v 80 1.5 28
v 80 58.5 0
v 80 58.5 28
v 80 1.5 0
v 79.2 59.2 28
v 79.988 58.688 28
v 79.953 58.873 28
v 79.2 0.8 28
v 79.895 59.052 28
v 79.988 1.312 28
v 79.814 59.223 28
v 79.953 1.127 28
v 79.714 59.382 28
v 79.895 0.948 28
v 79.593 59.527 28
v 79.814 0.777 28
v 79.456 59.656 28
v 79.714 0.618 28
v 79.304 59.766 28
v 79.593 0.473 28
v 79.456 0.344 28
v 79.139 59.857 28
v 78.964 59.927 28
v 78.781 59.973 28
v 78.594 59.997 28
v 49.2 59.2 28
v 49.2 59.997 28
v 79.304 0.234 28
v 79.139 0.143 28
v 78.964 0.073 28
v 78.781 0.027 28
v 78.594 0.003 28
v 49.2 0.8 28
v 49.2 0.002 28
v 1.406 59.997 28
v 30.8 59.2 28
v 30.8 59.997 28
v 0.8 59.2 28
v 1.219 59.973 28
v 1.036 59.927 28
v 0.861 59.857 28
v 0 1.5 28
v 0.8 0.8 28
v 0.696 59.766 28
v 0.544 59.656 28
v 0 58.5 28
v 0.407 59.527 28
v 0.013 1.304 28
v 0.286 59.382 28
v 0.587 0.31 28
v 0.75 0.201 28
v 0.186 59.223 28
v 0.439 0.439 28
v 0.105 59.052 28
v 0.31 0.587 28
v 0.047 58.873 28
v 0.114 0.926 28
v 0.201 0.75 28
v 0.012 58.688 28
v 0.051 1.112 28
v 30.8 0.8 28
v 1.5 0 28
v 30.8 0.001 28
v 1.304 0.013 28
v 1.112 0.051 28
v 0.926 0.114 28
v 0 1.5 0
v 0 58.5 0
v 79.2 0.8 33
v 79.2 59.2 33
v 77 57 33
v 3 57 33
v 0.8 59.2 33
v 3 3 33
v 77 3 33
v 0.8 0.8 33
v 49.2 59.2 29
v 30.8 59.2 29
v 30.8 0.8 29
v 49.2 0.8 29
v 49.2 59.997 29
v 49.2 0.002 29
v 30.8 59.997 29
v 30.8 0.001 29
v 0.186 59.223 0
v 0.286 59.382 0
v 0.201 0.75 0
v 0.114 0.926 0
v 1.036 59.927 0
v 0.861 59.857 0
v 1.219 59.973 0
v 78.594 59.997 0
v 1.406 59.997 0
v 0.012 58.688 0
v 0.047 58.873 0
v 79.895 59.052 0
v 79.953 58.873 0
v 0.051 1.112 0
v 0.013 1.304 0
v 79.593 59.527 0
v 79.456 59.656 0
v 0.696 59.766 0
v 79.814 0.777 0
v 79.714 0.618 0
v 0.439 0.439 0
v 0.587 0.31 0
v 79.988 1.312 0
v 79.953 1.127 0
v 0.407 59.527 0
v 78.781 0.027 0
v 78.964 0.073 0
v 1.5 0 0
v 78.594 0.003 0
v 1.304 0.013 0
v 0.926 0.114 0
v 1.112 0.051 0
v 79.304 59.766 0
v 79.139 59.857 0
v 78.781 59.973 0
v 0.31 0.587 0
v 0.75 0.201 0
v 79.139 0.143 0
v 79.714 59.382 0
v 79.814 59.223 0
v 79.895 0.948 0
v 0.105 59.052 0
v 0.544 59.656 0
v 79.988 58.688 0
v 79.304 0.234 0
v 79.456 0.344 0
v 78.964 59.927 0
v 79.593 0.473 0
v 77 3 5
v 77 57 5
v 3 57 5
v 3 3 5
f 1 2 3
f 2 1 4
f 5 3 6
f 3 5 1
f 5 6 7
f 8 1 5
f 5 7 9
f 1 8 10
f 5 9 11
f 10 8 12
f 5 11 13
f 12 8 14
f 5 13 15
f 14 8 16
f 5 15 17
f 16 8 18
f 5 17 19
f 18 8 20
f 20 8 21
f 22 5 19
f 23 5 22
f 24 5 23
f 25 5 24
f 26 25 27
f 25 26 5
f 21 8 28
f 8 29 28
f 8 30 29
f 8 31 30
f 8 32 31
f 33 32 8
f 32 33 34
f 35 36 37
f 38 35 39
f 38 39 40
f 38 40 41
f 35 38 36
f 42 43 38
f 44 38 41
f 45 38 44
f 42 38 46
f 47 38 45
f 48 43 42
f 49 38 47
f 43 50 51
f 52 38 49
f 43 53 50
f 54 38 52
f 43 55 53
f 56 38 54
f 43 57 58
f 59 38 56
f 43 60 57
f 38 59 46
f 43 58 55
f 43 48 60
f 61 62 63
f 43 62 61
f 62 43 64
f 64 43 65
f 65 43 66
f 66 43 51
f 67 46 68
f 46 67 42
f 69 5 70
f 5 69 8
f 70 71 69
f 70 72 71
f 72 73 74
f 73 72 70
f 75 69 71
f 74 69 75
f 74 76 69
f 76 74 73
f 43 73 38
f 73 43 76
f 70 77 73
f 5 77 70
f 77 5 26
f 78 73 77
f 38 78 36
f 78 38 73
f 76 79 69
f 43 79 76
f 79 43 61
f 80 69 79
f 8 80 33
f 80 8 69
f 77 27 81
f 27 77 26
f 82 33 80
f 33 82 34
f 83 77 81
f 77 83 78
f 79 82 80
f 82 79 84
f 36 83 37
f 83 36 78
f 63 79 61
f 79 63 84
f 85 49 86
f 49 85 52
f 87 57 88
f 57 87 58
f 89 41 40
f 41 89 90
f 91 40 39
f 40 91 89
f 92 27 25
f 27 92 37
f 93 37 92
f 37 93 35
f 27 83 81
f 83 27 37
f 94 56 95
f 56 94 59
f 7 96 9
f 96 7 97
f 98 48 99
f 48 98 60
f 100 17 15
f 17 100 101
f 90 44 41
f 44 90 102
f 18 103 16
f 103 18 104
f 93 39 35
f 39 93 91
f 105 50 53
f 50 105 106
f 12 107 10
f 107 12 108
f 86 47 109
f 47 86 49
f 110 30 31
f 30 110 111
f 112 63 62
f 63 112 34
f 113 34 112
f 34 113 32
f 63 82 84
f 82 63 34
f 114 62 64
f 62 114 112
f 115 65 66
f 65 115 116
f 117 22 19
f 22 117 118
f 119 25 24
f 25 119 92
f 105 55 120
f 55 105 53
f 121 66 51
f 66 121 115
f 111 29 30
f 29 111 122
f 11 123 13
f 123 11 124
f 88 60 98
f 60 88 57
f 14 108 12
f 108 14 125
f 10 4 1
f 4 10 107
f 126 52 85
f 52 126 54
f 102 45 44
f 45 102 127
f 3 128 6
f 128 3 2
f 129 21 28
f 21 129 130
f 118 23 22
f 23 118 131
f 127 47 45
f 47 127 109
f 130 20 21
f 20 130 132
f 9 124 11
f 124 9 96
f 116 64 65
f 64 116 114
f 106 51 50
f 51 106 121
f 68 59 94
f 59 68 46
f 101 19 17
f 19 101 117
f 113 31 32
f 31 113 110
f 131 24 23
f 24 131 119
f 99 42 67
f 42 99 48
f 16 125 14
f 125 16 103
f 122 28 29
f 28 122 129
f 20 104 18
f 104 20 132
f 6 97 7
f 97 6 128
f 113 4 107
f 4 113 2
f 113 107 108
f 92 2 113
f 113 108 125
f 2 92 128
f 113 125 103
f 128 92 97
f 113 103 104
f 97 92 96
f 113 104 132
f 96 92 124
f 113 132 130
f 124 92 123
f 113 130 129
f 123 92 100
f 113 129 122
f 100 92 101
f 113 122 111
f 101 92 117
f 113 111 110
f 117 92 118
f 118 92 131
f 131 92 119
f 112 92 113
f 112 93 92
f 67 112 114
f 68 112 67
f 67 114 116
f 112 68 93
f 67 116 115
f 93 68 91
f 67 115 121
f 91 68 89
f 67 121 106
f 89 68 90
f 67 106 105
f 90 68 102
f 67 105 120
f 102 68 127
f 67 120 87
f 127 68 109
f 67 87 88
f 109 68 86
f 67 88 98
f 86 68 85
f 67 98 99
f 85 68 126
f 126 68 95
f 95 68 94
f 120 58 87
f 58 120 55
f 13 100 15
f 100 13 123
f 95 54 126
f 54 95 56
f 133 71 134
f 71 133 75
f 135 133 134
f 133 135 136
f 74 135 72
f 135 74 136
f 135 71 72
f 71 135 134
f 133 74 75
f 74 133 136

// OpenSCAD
$fn=48;
translate([0,0,0])
{
difference()
{
    translate(v = [1.50, 1.50, 0.00])
    {
        hull()
        {
            cylinder(center = false, r1 = 1.5, r2 = 1.5, h = 35);
            translate(v = [77.00, 0.00, 0.00])
            {
                cylinder(center = false, r1 = 1.5, r2 = 1.5, h = 35, $fn = 50);
            }
            translate(v = [0.00, 57.00, 0.00])
            {
                cylinder(center = false, r1 = 1.5, r2 = 1.5, h = 35, $fn = 50);
            }
            translate(v = [77.00, 57.00, 0.00])
            {
                cylinder(center = false, r1 = 1.5, r2 = 1.5, h = 35, $fn = 50);
            }
        }
    }
    translate(v = [0.00, 0.00, 28.00])
    {
        difference()
        {
            cube(size = [80.00, 60.00, 7.00], center = false); 
            translate(v = [0.80, 0.80, 0.00])
            {
                cube(size = [78.40, 58.40, 5.00], center = false); 
            }
            translate(v = [30.80, 0.00, 0.00])
            {
                cube(size = [18.40, 60.00, 1.00], center = false); 
            }
            translate(v = [0.00, 30.80, 0.00])
            {
                cube(size = [80.00, -1.60, 1.00], center = false); 
            }
        }
    }
    translate(v = [3.00, 3.00, 5.00])
    {
        cube(size = [74.00, 54.00, 28.00], center = false); 
    }
}

}
